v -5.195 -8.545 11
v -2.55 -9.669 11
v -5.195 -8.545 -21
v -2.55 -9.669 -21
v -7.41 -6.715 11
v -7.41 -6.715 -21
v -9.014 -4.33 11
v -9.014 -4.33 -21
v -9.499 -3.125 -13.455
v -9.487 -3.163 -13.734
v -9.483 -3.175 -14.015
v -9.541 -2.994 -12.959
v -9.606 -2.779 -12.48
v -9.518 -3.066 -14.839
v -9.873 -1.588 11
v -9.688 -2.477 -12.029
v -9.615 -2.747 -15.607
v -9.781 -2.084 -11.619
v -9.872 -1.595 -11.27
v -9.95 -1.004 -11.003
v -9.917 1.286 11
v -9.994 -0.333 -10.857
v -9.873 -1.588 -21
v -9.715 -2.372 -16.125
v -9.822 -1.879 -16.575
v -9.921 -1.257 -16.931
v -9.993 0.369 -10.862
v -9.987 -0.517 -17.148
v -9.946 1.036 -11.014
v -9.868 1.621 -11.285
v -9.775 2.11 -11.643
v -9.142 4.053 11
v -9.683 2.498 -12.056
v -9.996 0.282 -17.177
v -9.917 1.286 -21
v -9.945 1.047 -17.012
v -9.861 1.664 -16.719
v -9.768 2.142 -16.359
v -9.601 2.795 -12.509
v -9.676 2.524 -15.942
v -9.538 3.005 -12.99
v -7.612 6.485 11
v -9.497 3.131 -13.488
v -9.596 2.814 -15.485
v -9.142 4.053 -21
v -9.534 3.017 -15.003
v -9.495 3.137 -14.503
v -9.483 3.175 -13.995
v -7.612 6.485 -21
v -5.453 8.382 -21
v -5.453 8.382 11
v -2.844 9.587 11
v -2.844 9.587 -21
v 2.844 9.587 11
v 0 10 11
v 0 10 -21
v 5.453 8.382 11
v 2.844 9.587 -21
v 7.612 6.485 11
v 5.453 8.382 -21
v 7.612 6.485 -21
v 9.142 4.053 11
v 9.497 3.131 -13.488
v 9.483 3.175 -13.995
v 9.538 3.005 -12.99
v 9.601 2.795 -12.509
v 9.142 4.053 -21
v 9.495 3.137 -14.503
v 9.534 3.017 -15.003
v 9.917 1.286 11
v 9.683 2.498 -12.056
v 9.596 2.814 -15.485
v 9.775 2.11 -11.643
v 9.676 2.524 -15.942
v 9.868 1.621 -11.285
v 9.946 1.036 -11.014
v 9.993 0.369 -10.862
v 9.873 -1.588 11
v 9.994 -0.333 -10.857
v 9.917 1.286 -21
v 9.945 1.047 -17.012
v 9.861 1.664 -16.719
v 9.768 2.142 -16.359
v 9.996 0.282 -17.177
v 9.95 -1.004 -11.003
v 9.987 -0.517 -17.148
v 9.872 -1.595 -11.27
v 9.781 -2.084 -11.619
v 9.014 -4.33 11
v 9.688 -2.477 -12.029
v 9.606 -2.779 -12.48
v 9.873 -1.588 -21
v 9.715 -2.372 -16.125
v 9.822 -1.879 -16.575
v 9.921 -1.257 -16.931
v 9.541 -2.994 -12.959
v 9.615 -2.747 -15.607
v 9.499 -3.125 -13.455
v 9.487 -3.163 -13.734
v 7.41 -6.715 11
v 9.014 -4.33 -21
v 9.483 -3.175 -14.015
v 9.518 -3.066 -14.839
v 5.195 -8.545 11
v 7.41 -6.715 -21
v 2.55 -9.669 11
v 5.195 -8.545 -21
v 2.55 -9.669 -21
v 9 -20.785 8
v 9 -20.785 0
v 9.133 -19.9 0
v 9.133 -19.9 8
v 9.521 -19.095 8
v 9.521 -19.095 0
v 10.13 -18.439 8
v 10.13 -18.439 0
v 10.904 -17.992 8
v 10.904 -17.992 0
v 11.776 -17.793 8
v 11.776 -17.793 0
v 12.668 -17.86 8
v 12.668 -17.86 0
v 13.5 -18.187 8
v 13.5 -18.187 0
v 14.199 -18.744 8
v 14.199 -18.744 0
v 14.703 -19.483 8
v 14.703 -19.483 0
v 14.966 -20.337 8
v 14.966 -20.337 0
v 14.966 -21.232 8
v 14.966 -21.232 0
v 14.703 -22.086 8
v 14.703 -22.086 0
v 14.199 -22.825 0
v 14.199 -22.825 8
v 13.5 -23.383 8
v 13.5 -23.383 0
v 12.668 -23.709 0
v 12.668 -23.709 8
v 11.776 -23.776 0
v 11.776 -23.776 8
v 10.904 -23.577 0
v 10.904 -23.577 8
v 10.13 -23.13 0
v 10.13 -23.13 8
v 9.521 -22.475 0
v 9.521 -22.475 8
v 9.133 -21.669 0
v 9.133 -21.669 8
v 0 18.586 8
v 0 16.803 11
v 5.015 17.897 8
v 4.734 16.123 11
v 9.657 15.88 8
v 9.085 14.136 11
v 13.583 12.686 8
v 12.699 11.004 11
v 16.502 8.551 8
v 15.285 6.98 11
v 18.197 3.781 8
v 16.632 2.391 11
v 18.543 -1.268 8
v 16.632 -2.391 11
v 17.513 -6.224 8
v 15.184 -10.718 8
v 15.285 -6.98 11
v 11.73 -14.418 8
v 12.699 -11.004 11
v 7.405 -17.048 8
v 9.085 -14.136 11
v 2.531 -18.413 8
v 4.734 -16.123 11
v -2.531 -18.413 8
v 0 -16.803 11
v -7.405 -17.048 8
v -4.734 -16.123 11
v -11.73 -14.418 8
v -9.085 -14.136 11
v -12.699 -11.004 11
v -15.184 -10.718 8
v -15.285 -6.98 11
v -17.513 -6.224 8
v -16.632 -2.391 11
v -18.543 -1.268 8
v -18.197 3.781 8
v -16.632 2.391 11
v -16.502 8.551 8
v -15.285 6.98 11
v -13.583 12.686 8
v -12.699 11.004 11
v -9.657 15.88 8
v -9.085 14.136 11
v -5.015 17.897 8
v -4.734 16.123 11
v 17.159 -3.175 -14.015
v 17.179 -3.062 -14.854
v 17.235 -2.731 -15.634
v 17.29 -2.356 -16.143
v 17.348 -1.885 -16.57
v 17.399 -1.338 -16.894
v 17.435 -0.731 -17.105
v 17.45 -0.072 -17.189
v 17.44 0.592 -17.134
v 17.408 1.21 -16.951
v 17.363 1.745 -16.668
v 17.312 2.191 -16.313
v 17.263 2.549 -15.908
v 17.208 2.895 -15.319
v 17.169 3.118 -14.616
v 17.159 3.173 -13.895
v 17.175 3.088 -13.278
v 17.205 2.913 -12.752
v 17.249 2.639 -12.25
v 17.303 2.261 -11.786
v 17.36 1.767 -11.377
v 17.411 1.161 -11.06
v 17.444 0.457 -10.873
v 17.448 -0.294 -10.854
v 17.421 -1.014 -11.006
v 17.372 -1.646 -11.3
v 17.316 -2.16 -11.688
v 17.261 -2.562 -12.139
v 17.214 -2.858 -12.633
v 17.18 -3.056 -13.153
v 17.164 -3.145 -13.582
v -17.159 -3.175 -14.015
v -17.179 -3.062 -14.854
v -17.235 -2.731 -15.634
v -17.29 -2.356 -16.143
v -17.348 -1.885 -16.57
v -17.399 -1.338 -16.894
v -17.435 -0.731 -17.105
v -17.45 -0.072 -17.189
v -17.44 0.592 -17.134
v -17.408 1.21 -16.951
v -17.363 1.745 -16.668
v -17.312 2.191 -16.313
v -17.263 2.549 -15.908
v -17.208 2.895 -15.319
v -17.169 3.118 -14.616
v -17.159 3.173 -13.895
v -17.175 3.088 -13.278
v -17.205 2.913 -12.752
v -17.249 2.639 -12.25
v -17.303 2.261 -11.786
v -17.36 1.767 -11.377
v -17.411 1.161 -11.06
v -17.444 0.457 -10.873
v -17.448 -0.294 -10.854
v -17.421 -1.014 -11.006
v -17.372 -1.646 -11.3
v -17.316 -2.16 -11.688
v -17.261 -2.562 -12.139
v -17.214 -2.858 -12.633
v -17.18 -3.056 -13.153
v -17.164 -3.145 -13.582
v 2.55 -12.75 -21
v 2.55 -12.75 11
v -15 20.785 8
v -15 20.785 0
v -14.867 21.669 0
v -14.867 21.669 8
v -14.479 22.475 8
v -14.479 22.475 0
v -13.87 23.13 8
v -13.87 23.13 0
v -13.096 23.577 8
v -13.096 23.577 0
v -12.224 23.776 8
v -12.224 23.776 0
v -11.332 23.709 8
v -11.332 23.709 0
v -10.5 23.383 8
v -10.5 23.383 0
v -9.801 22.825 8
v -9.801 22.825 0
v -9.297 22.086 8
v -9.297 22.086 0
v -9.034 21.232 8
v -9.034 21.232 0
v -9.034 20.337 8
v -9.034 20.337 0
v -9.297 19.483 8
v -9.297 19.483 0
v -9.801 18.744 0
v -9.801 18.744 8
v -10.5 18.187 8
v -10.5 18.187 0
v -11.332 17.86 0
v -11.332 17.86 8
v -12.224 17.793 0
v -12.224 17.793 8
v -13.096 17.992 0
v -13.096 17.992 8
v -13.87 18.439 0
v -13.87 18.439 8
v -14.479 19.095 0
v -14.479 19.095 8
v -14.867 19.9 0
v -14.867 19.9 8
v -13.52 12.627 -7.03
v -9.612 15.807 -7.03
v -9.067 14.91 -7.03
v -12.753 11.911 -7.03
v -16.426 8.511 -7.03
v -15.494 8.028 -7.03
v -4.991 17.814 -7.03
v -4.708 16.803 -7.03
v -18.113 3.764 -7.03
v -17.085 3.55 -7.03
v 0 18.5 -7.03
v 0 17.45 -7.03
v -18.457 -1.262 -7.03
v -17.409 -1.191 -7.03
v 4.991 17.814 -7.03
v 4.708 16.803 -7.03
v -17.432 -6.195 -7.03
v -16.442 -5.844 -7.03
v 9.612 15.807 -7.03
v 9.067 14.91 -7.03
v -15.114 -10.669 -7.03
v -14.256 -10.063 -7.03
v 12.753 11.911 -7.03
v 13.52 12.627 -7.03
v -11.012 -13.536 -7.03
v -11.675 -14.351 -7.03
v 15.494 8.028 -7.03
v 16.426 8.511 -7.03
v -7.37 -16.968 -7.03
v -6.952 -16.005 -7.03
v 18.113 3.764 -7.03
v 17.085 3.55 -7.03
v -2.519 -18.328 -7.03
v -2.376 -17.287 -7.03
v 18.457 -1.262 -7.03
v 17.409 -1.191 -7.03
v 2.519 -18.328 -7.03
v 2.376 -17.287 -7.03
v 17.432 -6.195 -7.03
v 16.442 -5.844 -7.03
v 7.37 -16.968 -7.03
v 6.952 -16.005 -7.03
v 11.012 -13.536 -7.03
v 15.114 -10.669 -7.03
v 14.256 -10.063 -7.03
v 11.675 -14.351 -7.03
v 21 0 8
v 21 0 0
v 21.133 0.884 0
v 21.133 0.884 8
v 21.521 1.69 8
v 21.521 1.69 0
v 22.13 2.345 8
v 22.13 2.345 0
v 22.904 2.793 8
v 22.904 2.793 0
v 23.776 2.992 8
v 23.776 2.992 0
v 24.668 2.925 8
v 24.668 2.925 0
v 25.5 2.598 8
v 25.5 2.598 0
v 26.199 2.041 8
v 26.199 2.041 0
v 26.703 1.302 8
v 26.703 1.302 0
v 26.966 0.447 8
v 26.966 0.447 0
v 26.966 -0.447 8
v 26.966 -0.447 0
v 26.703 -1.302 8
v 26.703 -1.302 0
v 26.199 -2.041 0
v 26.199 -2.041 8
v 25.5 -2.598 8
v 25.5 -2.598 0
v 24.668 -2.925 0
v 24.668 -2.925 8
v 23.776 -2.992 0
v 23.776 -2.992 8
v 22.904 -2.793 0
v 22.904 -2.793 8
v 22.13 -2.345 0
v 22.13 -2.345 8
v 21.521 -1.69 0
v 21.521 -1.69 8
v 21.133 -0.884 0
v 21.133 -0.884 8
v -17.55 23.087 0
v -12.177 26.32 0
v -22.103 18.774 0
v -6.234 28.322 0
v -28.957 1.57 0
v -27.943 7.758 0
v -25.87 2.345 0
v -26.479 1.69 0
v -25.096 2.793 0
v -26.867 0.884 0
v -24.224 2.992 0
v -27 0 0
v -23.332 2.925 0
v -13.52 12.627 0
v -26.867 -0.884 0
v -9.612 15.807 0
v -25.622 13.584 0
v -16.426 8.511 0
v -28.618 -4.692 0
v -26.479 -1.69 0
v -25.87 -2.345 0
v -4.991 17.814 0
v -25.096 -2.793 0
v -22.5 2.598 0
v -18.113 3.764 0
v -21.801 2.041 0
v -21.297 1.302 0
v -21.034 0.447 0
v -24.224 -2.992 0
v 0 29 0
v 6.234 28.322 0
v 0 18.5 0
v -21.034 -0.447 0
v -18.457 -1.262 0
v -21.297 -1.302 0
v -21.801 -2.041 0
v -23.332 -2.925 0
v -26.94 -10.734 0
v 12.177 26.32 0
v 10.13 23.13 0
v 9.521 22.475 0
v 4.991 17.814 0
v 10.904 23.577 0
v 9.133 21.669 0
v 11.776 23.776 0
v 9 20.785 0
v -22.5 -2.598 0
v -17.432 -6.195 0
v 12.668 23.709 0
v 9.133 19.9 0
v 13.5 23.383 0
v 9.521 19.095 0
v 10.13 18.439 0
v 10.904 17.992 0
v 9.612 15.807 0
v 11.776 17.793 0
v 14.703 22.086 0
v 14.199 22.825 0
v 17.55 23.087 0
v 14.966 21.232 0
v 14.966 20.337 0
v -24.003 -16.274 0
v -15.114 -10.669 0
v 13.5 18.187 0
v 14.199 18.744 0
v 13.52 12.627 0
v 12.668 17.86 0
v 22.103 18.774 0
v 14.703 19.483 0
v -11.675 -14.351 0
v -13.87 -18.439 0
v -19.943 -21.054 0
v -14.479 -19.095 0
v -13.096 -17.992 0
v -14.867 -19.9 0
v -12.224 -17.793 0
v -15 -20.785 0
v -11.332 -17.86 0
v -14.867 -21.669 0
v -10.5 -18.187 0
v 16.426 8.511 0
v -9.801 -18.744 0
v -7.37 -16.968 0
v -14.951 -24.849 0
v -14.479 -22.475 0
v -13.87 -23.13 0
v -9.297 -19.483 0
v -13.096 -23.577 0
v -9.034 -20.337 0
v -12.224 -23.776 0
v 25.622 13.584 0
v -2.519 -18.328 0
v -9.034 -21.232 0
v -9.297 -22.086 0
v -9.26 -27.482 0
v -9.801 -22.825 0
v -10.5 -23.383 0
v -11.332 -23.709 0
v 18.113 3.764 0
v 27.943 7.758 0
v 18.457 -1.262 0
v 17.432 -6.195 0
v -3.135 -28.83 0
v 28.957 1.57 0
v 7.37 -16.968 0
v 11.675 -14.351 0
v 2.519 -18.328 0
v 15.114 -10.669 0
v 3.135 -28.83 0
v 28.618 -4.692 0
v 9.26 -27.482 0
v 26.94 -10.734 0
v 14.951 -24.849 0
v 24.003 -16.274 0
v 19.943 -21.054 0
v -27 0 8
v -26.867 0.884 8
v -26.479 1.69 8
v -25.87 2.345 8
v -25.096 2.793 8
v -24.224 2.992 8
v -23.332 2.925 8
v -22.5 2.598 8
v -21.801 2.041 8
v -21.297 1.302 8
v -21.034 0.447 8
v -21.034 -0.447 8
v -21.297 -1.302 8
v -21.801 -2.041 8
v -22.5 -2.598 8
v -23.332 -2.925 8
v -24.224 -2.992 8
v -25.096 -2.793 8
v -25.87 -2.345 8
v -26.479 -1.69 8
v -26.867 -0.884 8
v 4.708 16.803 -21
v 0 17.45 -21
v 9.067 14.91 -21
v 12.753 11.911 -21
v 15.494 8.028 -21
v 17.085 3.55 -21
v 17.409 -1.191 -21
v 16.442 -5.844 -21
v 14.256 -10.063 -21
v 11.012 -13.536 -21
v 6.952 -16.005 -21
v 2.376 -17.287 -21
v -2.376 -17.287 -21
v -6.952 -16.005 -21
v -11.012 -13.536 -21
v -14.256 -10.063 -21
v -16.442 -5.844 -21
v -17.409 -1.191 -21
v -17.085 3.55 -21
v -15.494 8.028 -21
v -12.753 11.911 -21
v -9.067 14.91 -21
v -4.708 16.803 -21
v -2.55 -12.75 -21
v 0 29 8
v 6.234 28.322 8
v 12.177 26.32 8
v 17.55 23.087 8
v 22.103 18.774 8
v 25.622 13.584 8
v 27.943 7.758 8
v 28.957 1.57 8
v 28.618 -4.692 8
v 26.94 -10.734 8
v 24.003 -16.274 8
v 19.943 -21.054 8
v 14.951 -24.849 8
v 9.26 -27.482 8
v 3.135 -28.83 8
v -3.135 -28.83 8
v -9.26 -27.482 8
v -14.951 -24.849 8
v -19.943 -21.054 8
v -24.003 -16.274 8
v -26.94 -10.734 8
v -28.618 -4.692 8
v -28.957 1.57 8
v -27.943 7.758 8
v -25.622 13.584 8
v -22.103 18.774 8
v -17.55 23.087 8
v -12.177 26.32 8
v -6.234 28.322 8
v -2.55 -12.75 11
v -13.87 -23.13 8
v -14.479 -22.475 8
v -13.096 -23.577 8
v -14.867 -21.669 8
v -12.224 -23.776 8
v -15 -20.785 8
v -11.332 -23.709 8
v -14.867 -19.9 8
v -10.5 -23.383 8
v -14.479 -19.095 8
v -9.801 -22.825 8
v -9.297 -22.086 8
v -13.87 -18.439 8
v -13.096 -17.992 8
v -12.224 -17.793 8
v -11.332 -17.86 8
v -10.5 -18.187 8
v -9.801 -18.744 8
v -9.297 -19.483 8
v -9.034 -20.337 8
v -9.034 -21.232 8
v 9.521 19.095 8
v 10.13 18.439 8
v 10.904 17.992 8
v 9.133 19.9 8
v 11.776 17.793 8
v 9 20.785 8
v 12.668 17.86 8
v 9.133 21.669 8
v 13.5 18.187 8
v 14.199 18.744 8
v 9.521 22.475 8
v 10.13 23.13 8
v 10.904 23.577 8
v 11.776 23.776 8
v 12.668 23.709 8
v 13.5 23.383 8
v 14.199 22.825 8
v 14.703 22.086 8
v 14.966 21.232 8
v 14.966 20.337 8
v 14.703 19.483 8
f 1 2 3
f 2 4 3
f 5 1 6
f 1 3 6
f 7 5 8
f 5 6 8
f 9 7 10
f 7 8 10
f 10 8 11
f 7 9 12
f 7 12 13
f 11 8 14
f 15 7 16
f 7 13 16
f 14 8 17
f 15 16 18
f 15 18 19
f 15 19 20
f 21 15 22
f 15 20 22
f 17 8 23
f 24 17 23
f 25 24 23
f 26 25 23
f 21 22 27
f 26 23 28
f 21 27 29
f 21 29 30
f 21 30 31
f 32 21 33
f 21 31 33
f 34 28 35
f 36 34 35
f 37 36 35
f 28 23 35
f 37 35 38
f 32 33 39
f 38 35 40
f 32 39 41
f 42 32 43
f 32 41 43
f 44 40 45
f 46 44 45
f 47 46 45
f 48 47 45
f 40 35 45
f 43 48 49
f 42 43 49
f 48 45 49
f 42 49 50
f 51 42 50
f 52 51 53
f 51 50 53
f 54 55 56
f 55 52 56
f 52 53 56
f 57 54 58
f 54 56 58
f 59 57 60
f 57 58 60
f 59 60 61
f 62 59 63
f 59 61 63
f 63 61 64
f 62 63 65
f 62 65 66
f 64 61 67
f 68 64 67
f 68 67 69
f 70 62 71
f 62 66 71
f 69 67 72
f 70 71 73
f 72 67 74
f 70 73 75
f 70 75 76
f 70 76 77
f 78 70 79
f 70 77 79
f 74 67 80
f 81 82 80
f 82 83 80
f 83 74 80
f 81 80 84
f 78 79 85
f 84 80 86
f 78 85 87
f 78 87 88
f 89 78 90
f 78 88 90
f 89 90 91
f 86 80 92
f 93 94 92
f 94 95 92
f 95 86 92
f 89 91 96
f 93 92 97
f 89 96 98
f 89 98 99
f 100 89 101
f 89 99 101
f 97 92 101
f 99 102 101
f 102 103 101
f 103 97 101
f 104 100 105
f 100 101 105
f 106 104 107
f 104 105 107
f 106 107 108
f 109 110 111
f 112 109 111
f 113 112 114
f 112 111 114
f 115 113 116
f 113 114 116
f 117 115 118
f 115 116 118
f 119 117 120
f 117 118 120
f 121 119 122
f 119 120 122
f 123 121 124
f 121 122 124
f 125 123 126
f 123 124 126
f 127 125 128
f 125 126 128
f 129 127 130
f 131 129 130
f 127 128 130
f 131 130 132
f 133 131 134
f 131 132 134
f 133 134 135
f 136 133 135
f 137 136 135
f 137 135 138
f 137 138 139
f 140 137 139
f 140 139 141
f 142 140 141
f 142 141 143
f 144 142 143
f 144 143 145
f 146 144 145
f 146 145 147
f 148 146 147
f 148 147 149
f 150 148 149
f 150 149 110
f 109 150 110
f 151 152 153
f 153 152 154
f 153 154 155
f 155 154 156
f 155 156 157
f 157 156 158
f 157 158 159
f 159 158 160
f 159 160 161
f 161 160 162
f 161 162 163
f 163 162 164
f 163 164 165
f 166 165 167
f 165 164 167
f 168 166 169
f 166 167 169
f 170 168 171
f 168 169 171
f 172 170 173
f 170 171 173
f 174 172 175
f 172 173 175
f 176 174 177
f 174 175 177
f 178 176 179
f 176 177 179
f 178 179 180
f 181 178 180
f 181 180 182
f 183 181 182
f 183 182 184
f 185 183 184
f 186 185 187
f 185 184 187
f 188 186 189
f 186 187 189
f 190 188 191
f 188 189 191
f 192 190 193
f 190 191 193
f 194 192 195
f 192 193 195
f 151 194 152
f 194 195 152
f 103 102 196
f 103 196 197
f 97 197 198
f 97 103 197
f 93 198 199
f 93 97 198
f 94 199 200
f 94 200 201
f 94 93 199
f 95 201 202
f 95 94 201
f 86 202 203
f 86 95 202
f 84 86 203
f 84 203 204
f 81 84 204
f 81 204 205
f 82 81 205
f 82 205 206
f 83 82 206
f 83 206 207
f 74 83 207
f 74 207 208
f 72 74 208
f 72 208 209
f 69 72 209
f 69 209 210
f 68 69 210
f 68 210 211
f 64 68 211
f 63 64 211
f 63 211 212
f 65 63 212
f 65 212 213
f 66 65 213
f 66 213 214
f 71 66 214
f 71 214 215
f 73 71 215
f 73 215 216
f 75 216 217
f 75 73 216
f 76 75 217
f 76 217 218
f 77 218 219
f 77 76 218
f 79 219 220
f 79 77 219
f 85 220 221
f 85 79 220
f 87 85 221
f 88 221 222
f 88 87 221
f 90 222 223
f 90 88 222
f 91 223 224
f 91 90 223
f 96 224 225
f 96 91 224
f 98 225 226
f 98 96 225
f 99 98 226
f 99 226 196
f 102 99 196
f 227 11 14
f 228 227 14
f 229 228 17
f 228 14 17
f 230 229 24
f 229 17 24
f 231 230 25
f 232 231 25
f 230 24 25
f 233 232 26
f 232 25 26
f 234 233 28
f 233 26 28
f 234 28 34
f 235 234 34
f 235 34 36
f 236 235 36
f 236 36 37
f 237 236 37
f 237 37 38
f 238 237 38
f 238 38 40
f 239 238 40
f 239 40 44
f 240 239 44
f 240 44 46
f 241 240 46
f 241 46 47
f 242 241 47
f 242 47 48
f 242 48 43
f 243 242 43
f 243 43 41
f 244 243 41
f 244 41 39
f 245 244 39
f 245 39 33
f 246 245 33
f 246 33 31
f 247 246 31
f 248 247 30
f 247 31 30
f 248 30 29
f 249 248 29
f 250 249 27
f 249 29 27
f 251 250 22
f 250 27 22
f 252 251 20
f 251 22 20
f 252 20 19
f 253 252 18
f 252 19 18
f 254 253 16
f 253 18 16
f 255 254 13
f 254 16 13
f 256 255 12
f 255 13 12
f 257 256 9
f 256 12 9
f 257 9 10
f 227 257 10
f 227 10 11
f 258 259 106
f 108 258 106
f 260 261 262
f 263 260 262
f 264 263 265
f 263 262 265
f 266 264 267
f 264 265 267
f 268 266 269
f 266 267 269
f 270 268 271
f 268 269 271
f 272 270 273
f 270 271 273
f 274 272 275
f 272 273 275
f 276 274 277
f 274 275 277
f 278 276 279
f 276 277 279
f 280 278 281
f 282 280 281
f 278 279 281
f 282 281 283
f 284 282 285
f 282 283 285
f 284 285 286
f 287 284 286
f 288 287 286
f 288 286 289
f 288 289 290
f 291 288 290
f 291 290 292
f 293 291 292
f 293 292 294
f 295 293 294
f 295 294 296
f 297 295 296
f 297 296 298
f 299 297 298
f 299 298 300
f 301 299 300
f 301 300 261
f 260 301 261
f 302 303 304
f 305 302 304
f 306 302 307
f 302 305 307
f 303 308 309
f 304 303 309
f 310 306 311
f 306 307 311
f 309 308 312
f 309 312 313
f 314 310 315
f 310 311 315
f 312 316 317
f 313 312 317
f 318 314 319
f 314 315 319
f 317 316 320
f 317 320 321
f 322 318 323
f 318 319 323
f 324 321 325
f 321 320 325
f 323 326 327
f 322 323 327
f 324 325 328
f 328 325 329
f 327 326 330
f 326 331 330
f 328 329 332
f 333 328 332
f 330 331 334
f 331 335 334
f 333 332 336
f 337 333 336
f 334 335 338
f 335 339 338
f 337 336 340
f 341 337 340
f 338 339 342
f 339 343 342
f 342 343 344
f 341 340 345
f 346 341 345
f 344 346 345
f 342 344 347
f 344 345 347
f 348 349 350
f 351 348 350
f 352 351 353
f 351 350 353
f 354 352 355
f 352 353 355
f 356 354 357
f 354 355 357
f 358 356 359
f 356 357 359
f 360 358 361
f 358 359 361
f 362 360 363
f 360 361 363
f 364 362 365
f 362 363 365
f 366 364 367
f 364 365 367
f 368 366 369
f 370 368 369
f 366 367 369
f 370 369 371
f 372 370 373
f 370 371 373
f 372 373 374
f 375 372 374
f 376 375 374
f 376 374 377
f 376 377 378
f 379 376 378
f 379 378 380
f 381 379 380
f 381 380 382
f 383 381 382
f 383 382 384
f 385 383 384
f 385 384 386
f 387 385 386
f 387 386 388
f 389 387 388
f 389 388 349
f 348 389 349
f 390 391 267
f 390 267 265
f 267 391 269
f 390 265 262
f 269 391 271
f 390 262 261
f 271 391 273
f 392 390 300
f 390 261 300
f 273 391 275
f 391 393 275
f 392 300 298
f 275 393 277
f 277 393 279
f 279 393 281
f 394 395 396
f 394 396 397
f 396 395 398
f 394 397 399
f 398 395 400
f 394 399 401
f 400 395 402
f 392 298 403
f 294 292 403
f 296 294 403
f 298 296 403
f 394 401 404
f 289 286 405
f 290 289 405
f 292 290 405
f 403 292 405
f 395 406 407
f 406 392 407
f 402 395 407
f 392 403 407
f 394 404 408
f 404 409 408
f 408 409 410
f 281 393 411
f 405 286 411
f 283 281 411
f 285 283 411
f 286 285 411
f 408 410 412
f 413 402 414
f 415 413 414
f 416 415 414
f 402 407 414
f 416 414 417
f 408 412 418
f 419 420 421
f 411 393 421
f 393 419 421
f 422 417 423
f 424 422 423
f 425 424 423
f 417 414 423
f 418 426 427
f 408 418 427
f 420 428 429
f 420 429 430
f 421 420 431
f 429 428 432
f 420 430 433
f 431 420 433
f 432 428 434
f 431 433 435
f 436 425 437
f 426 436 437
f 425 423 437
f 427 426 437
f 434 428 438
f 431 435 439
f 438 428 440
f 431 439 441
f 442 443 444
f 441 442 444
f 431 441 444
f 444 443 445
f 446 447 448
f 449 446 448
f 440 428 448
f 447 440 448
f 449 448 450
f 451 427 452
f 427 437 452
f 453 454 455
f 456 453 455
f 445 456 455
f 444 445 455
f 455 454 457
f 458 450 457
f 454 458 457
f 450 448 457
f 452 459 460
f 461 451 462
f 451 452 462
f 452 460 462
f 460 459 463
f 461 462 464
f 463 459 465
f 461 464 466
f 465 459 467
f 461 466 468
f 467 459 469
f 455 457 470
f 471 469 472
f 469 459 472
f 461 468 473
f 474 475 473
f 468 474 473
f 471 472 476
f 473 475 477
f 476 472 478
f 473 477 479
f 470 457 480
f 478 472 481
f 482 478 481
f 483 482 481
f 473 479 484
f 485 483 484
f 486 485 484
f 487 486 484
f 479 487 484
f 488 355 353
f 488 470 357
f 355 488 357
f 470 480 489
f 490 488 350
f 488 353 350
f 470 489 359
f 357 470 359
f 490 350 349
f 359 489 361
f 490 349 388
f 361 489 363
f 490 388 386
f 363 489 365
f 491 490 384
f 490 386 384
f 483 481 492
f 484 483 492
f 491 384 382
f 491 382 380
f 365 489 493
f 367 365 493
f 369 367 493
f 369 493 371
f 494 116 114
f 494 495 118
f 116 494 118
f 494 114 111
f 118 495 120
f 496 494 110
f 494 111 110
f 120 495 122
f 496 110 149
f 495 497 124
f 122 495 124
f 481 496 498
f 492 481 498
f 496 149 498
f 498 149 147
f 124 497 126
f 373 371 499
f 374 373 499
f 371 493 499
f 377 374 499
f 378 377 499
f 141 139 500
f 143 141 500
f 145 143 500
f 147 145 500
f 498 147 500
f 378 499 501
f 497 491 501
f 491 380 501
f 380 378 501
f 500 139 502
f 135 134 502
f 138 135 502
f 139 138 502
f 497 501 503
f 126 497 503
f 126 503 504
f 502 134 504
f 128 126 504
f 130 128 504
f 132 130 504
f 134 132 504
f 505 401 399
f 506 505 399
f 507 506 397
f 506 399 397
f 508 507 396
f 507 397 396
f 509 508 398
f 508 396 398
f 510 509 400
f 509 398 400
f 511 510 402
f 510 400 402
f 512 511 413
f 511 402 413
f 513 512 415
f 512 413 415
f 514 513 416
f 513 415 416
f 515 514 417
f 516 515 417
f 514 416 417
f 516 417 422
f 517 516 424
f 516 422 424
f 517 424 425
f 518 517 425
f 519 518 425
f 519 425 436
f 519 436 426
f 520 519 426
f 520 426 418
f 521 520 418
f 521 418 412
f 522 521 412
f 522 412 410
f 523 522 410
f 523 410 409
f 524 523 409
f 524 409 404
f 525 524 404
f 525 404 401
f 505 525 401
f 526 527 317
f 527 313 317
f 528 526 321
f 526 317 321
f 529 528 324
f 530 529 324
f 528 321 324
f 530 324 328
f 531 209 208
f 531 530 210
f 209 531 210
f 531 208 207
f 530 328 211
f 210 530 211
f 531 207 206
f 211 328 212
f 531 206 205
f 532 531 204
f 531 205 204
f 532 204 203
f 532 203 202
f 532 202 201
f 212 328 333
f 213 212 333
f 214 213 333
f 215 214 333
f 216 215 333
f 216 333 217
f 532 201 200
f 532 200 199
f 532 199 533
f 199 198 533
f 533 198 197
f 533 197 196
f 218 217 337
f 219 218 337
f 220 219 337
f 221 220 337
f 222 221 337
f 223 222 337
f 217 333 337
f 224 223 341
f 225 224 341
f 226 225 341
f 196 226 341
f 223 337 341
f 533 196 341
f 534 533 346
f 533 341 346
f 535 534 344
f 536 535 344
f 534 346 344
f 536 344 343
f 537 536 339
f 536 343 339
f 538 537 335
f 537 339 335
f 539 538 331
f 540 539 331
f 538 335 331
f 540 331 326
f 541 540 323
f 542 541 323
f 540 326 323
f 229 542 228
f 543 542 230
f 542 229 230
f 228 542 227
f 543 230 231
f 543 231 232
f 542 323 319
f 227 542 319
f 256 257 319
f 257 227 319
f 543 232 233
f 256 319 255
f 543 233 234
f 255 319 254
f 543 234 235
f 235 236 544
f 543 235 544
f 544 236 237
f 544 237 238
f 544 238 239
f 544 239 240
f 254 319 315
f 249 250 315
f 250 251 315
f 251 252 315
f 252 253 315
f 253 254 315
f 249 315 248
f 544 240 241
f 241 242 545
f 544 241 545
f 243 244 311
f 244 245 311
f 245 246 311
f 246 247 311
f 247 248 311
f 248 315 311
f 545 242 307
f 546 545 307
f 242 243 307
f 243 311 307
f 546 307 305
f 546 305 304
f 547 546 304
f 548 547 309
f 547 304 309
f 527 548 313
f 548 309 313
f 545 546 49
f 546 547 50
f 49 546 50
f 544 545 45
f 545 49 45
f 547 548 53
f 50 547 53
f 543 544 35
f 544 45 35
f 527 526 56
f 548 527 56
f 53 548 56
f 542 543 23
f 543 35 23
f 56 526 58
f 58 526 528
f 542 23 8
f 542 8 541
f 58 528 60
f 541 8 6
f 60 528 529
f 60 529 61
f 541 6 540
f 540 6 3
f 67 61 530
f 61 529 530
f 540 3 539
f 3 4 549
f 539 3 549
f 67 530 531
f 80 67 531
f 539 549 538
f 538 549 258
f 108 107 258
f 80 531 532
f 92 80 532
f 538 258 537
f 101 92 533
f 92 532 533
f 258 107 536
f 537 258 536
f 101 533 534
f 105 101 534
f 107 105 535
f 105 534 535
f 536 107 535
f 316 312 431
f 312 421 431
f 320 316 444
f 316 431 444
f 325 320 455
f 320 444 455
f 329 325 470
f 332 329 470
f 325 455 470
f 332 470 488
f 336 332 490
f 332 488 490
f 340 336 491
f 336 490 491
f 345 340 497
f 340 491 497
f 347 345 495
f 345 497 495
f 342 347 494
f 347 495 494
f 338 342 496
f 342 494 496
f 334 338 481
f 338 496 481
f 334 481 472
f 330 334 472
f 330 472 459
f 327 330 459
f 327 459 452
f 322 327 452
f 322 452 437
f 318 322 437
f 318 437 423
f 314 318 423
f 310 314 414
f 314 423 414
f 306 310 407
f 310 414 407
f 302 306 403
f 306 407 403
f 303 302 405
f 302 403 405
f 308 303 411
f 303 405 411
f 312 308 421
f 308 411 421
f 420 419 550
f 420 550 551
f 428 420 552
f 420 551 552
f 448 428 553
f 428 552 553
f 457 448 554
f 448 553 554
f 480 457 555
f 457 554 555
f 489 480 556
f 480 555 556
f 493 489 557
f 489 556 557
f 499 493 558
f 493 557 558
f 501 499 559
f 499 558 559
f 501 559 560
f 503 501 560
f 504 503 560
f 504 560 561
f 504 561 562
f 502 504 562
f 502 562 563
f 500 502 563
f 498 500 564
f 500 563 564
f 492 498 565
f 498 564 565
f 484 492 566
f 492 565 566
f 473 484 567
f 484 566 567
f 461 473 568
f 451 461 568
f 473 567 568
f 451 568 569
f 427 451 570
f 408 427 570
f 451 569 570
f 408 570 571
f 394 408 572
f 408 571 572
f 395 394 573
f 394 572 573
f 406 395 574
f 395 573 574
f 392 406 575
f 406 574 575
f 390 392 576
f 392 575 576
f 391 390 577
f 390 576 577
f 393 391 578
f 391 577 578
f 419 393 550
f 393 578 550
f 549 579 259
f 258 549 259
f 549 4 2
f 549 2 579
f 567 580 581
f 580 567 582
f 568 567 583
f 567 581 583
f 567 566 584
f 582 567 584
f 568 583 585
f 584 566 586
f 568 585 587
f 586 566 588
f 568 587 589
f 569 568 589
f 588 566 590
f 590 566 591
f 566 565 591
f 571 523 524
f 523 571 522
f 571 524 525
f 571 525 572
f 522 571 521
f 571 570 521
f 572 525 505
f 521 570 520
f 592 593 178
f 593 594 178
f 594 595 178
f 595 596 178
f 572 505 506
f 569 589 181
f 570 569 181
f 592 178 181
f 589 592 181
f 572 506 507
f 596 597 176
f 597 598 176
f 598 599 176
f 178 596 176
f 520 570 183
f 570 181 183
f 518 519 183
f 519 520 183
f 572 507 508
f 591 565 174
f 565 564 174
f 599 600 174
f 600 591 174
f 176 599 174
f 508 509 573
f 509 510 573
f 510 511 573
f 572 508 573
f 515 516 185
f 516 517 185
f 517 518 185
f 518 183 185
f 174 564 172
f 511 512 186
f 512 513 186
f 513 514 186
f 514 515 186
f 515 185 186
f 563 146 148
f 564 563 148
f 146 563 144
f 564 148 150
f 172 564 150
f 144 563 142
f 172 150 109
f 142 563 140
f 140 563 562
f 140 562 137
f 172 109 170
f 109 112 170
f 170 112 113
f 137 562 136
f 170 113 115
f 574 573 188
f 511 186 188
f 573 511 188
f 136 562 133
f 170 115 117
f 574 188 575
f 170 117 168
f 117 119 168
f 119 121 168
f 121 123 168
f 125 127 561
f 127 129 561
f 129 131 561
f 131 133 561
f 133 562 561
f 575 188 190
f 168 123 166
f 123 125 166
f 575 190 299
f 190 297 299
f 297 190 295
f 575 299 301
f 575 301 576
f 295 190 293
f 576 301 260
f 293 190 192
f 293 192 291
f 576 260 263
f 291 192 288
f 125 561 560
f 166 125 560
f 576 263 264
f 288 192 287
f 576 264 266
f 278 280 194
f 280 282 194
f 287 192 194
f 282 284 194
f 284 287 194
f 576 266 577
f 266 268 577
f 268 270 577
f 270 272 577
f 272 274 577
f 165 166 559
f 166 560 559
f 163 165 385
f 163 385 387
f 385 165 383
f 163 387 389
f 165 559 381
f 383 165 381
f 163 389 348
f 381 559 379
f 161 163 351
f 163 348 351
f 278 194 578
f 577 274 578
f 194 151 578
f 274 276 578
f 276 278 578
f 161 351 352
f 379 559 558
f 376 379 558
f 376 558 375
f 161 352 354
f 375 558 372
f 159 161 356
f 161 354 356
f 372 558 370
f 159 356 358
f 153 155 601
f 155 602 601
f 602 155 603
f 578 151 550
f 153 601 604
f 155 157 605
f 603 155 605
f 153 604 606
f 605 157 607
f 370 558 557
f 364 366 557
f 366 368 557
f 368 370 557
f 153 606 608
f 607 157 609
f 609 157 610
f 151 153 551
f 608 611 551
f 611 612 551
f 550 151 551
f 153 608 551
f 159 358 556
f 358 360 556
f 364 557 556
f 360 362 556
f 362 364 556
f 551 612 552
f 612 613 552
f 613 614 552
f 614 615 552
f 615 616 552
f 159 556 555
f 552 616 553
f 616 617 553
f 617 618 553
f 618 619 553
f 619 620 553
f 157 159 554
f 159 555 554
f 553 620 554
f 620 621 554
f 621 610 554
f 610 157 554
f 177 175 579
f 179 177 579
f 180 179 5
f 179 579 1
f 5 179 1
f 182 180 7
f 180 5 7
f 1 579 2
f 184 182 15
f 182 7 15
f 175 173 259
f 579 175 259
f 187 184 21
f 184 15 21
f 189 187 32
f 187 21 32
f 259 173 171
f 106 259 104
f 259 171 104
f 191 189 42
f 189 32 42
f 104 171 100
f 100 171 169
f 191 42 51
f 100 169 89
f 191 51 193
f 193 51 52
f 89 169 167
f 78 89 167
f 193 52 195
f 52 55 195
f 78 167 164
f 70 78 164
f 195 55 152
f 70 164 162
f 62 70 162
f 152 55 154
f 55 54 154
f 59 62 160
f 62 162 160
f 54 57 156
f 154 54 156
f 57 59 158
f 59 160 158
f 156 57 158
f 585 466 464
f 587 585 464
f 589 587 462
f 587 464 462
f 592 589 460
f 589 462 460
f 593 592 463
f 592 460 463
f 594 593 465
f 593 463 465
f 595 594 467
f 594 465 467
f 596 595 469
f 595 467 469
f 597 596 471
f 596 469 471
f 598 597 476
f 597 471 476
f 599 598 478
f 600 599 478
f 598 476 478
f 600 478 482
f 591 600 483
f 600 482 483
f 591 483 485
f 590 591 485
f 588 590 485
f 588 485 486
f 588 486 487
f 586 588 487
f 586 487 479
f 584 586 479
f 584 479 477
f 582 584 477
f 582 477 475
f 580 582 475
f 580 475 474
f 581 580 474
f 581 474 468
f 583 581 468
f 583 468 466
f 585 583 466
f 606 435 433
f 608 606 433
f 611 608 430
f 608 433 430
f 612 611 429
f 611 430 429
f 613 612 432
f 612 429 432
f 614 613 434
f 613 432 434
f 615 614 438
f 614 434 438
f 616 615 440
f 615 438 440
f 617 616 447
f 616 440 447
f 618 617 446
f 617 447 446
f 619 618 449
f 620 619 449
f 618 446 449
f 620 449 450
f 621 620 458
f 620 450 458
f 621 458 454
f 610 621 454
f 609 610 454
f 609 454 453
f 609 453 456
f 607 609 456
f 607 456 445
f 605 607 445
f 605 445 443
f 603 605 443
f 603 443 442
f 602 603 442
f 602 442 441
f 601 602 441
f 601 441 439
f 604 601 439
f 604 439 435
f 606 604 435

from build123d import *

# Parameters (mm, degrees)
CUT_EXTRUDE1_DEPTH      = 12
CUT_EXTRUDE1_DEPTH_BACK = 22
SKETCH3_R               = 3
CUT_EXTRUDE2_DEPTH      = 22
CUT_EXTRUDE2_DEPTH_BACK = 12
SKETCH4_R               = 3.175
CUT_EXTRUDE3_DEPTH      = 30
CUT_EXTRUDE3_DEPTH_BACK = 30


with BuildPart() as part:
    # Sketch1 → Revolve1 (revolve)
    with BuildSketch(Plane(origin=(0, 0, 0), x_dir=(0, 0, -1), z_dir=(1, 0, 0))):
        Polygon((21, 17.45), (7.03, 17.45), (7.03, 18.5), (0, 18.5), (0, 29), (-8, 29), (-8, 18.586235054), (-11, 16.803216346), (-11, 10), (21, 10), align=None)
    revolve(axis=Axis((0, 0, 11), (0, 0, -1)))

    # Sketch2 → Cut-Extrude1 (cut, two sides)
    with BuildSketch(Plane.XY) as cut_extrude1_sk:
        with BuildLine():
            Line((-2.55, -12.75), (2.55, -12.75))
            Line((2.55, -12.75), (2.55, -9.66941053))
            ThreePointArc((2.55, -9.66941053), (0, -10), (-2.55, -9.66941053))
            Line((-2.55, -9.66941053), (-2.55, -12.75))
        make_face()
    extrude(amount=CUT_EXTRUDE1_DEPTH, mode=Mode.SUBTRACT)
    extrude(cut_extrude1_sk.sketch, amount=-CUT_EXTRUDE1_DEPTH_BACK, mode=Mode.SUBTRACT)

    # Sketch3 → Cut-Extrude2 (cut, two sides)
    with BuildSketch(Plane(origin=(0, 0, 0), x_dir=(-1, 0, 0), z_dir=(0, 0, -1))) as cut_extrude2_sk:
        with Locations((-24, 0)):
            Circle(SKETCH3_R)
        with Locations((-12, 20.784609691)):
            Circle(SKETCH3_R)
        with Locations((12, 20.784609691)):
            Circle(SKETCH3_R)
        with Locations((24, 0)):
            Circle(SKETCH3_R)
        with Locations((12, -20.784609691)):
            Circle(SKETCH3_R)
        with Locations((-12, -20.784609691)):
            Circle(SKETCH3_R)
    extrude(amount=CUT_EXTRUDE2_DEPTH, mode=Mode.SUBTRACT)
    extrude(cut_extrude2_sk.sketch, amount=-CUT_EXTRUDE2_DEPTH_BACK, mode=Mode.SUBTRACT)

    # Sketch4 → Cut-Extrude3 (cut, two sides)
    with BuildSketch(Plane(origin=(0, 0, 0), x_dir=(0, -1, 0), z_dir=(1, 0, 0))) as cut_extrude3_sk:
        with Locations((0, 14.015)):
            Circle(SKETCH4_R)
    extrude(amount=CUT_EXTRUDE3_DEPTH, mode=Mode.SUBTRACT)
    extrude(cut_extrude3_sk.sketch, amount=-CUT_EXTRUDE3_DEPTH_BACK, mode=Mode.SUBTRACT)


solid = part.part
